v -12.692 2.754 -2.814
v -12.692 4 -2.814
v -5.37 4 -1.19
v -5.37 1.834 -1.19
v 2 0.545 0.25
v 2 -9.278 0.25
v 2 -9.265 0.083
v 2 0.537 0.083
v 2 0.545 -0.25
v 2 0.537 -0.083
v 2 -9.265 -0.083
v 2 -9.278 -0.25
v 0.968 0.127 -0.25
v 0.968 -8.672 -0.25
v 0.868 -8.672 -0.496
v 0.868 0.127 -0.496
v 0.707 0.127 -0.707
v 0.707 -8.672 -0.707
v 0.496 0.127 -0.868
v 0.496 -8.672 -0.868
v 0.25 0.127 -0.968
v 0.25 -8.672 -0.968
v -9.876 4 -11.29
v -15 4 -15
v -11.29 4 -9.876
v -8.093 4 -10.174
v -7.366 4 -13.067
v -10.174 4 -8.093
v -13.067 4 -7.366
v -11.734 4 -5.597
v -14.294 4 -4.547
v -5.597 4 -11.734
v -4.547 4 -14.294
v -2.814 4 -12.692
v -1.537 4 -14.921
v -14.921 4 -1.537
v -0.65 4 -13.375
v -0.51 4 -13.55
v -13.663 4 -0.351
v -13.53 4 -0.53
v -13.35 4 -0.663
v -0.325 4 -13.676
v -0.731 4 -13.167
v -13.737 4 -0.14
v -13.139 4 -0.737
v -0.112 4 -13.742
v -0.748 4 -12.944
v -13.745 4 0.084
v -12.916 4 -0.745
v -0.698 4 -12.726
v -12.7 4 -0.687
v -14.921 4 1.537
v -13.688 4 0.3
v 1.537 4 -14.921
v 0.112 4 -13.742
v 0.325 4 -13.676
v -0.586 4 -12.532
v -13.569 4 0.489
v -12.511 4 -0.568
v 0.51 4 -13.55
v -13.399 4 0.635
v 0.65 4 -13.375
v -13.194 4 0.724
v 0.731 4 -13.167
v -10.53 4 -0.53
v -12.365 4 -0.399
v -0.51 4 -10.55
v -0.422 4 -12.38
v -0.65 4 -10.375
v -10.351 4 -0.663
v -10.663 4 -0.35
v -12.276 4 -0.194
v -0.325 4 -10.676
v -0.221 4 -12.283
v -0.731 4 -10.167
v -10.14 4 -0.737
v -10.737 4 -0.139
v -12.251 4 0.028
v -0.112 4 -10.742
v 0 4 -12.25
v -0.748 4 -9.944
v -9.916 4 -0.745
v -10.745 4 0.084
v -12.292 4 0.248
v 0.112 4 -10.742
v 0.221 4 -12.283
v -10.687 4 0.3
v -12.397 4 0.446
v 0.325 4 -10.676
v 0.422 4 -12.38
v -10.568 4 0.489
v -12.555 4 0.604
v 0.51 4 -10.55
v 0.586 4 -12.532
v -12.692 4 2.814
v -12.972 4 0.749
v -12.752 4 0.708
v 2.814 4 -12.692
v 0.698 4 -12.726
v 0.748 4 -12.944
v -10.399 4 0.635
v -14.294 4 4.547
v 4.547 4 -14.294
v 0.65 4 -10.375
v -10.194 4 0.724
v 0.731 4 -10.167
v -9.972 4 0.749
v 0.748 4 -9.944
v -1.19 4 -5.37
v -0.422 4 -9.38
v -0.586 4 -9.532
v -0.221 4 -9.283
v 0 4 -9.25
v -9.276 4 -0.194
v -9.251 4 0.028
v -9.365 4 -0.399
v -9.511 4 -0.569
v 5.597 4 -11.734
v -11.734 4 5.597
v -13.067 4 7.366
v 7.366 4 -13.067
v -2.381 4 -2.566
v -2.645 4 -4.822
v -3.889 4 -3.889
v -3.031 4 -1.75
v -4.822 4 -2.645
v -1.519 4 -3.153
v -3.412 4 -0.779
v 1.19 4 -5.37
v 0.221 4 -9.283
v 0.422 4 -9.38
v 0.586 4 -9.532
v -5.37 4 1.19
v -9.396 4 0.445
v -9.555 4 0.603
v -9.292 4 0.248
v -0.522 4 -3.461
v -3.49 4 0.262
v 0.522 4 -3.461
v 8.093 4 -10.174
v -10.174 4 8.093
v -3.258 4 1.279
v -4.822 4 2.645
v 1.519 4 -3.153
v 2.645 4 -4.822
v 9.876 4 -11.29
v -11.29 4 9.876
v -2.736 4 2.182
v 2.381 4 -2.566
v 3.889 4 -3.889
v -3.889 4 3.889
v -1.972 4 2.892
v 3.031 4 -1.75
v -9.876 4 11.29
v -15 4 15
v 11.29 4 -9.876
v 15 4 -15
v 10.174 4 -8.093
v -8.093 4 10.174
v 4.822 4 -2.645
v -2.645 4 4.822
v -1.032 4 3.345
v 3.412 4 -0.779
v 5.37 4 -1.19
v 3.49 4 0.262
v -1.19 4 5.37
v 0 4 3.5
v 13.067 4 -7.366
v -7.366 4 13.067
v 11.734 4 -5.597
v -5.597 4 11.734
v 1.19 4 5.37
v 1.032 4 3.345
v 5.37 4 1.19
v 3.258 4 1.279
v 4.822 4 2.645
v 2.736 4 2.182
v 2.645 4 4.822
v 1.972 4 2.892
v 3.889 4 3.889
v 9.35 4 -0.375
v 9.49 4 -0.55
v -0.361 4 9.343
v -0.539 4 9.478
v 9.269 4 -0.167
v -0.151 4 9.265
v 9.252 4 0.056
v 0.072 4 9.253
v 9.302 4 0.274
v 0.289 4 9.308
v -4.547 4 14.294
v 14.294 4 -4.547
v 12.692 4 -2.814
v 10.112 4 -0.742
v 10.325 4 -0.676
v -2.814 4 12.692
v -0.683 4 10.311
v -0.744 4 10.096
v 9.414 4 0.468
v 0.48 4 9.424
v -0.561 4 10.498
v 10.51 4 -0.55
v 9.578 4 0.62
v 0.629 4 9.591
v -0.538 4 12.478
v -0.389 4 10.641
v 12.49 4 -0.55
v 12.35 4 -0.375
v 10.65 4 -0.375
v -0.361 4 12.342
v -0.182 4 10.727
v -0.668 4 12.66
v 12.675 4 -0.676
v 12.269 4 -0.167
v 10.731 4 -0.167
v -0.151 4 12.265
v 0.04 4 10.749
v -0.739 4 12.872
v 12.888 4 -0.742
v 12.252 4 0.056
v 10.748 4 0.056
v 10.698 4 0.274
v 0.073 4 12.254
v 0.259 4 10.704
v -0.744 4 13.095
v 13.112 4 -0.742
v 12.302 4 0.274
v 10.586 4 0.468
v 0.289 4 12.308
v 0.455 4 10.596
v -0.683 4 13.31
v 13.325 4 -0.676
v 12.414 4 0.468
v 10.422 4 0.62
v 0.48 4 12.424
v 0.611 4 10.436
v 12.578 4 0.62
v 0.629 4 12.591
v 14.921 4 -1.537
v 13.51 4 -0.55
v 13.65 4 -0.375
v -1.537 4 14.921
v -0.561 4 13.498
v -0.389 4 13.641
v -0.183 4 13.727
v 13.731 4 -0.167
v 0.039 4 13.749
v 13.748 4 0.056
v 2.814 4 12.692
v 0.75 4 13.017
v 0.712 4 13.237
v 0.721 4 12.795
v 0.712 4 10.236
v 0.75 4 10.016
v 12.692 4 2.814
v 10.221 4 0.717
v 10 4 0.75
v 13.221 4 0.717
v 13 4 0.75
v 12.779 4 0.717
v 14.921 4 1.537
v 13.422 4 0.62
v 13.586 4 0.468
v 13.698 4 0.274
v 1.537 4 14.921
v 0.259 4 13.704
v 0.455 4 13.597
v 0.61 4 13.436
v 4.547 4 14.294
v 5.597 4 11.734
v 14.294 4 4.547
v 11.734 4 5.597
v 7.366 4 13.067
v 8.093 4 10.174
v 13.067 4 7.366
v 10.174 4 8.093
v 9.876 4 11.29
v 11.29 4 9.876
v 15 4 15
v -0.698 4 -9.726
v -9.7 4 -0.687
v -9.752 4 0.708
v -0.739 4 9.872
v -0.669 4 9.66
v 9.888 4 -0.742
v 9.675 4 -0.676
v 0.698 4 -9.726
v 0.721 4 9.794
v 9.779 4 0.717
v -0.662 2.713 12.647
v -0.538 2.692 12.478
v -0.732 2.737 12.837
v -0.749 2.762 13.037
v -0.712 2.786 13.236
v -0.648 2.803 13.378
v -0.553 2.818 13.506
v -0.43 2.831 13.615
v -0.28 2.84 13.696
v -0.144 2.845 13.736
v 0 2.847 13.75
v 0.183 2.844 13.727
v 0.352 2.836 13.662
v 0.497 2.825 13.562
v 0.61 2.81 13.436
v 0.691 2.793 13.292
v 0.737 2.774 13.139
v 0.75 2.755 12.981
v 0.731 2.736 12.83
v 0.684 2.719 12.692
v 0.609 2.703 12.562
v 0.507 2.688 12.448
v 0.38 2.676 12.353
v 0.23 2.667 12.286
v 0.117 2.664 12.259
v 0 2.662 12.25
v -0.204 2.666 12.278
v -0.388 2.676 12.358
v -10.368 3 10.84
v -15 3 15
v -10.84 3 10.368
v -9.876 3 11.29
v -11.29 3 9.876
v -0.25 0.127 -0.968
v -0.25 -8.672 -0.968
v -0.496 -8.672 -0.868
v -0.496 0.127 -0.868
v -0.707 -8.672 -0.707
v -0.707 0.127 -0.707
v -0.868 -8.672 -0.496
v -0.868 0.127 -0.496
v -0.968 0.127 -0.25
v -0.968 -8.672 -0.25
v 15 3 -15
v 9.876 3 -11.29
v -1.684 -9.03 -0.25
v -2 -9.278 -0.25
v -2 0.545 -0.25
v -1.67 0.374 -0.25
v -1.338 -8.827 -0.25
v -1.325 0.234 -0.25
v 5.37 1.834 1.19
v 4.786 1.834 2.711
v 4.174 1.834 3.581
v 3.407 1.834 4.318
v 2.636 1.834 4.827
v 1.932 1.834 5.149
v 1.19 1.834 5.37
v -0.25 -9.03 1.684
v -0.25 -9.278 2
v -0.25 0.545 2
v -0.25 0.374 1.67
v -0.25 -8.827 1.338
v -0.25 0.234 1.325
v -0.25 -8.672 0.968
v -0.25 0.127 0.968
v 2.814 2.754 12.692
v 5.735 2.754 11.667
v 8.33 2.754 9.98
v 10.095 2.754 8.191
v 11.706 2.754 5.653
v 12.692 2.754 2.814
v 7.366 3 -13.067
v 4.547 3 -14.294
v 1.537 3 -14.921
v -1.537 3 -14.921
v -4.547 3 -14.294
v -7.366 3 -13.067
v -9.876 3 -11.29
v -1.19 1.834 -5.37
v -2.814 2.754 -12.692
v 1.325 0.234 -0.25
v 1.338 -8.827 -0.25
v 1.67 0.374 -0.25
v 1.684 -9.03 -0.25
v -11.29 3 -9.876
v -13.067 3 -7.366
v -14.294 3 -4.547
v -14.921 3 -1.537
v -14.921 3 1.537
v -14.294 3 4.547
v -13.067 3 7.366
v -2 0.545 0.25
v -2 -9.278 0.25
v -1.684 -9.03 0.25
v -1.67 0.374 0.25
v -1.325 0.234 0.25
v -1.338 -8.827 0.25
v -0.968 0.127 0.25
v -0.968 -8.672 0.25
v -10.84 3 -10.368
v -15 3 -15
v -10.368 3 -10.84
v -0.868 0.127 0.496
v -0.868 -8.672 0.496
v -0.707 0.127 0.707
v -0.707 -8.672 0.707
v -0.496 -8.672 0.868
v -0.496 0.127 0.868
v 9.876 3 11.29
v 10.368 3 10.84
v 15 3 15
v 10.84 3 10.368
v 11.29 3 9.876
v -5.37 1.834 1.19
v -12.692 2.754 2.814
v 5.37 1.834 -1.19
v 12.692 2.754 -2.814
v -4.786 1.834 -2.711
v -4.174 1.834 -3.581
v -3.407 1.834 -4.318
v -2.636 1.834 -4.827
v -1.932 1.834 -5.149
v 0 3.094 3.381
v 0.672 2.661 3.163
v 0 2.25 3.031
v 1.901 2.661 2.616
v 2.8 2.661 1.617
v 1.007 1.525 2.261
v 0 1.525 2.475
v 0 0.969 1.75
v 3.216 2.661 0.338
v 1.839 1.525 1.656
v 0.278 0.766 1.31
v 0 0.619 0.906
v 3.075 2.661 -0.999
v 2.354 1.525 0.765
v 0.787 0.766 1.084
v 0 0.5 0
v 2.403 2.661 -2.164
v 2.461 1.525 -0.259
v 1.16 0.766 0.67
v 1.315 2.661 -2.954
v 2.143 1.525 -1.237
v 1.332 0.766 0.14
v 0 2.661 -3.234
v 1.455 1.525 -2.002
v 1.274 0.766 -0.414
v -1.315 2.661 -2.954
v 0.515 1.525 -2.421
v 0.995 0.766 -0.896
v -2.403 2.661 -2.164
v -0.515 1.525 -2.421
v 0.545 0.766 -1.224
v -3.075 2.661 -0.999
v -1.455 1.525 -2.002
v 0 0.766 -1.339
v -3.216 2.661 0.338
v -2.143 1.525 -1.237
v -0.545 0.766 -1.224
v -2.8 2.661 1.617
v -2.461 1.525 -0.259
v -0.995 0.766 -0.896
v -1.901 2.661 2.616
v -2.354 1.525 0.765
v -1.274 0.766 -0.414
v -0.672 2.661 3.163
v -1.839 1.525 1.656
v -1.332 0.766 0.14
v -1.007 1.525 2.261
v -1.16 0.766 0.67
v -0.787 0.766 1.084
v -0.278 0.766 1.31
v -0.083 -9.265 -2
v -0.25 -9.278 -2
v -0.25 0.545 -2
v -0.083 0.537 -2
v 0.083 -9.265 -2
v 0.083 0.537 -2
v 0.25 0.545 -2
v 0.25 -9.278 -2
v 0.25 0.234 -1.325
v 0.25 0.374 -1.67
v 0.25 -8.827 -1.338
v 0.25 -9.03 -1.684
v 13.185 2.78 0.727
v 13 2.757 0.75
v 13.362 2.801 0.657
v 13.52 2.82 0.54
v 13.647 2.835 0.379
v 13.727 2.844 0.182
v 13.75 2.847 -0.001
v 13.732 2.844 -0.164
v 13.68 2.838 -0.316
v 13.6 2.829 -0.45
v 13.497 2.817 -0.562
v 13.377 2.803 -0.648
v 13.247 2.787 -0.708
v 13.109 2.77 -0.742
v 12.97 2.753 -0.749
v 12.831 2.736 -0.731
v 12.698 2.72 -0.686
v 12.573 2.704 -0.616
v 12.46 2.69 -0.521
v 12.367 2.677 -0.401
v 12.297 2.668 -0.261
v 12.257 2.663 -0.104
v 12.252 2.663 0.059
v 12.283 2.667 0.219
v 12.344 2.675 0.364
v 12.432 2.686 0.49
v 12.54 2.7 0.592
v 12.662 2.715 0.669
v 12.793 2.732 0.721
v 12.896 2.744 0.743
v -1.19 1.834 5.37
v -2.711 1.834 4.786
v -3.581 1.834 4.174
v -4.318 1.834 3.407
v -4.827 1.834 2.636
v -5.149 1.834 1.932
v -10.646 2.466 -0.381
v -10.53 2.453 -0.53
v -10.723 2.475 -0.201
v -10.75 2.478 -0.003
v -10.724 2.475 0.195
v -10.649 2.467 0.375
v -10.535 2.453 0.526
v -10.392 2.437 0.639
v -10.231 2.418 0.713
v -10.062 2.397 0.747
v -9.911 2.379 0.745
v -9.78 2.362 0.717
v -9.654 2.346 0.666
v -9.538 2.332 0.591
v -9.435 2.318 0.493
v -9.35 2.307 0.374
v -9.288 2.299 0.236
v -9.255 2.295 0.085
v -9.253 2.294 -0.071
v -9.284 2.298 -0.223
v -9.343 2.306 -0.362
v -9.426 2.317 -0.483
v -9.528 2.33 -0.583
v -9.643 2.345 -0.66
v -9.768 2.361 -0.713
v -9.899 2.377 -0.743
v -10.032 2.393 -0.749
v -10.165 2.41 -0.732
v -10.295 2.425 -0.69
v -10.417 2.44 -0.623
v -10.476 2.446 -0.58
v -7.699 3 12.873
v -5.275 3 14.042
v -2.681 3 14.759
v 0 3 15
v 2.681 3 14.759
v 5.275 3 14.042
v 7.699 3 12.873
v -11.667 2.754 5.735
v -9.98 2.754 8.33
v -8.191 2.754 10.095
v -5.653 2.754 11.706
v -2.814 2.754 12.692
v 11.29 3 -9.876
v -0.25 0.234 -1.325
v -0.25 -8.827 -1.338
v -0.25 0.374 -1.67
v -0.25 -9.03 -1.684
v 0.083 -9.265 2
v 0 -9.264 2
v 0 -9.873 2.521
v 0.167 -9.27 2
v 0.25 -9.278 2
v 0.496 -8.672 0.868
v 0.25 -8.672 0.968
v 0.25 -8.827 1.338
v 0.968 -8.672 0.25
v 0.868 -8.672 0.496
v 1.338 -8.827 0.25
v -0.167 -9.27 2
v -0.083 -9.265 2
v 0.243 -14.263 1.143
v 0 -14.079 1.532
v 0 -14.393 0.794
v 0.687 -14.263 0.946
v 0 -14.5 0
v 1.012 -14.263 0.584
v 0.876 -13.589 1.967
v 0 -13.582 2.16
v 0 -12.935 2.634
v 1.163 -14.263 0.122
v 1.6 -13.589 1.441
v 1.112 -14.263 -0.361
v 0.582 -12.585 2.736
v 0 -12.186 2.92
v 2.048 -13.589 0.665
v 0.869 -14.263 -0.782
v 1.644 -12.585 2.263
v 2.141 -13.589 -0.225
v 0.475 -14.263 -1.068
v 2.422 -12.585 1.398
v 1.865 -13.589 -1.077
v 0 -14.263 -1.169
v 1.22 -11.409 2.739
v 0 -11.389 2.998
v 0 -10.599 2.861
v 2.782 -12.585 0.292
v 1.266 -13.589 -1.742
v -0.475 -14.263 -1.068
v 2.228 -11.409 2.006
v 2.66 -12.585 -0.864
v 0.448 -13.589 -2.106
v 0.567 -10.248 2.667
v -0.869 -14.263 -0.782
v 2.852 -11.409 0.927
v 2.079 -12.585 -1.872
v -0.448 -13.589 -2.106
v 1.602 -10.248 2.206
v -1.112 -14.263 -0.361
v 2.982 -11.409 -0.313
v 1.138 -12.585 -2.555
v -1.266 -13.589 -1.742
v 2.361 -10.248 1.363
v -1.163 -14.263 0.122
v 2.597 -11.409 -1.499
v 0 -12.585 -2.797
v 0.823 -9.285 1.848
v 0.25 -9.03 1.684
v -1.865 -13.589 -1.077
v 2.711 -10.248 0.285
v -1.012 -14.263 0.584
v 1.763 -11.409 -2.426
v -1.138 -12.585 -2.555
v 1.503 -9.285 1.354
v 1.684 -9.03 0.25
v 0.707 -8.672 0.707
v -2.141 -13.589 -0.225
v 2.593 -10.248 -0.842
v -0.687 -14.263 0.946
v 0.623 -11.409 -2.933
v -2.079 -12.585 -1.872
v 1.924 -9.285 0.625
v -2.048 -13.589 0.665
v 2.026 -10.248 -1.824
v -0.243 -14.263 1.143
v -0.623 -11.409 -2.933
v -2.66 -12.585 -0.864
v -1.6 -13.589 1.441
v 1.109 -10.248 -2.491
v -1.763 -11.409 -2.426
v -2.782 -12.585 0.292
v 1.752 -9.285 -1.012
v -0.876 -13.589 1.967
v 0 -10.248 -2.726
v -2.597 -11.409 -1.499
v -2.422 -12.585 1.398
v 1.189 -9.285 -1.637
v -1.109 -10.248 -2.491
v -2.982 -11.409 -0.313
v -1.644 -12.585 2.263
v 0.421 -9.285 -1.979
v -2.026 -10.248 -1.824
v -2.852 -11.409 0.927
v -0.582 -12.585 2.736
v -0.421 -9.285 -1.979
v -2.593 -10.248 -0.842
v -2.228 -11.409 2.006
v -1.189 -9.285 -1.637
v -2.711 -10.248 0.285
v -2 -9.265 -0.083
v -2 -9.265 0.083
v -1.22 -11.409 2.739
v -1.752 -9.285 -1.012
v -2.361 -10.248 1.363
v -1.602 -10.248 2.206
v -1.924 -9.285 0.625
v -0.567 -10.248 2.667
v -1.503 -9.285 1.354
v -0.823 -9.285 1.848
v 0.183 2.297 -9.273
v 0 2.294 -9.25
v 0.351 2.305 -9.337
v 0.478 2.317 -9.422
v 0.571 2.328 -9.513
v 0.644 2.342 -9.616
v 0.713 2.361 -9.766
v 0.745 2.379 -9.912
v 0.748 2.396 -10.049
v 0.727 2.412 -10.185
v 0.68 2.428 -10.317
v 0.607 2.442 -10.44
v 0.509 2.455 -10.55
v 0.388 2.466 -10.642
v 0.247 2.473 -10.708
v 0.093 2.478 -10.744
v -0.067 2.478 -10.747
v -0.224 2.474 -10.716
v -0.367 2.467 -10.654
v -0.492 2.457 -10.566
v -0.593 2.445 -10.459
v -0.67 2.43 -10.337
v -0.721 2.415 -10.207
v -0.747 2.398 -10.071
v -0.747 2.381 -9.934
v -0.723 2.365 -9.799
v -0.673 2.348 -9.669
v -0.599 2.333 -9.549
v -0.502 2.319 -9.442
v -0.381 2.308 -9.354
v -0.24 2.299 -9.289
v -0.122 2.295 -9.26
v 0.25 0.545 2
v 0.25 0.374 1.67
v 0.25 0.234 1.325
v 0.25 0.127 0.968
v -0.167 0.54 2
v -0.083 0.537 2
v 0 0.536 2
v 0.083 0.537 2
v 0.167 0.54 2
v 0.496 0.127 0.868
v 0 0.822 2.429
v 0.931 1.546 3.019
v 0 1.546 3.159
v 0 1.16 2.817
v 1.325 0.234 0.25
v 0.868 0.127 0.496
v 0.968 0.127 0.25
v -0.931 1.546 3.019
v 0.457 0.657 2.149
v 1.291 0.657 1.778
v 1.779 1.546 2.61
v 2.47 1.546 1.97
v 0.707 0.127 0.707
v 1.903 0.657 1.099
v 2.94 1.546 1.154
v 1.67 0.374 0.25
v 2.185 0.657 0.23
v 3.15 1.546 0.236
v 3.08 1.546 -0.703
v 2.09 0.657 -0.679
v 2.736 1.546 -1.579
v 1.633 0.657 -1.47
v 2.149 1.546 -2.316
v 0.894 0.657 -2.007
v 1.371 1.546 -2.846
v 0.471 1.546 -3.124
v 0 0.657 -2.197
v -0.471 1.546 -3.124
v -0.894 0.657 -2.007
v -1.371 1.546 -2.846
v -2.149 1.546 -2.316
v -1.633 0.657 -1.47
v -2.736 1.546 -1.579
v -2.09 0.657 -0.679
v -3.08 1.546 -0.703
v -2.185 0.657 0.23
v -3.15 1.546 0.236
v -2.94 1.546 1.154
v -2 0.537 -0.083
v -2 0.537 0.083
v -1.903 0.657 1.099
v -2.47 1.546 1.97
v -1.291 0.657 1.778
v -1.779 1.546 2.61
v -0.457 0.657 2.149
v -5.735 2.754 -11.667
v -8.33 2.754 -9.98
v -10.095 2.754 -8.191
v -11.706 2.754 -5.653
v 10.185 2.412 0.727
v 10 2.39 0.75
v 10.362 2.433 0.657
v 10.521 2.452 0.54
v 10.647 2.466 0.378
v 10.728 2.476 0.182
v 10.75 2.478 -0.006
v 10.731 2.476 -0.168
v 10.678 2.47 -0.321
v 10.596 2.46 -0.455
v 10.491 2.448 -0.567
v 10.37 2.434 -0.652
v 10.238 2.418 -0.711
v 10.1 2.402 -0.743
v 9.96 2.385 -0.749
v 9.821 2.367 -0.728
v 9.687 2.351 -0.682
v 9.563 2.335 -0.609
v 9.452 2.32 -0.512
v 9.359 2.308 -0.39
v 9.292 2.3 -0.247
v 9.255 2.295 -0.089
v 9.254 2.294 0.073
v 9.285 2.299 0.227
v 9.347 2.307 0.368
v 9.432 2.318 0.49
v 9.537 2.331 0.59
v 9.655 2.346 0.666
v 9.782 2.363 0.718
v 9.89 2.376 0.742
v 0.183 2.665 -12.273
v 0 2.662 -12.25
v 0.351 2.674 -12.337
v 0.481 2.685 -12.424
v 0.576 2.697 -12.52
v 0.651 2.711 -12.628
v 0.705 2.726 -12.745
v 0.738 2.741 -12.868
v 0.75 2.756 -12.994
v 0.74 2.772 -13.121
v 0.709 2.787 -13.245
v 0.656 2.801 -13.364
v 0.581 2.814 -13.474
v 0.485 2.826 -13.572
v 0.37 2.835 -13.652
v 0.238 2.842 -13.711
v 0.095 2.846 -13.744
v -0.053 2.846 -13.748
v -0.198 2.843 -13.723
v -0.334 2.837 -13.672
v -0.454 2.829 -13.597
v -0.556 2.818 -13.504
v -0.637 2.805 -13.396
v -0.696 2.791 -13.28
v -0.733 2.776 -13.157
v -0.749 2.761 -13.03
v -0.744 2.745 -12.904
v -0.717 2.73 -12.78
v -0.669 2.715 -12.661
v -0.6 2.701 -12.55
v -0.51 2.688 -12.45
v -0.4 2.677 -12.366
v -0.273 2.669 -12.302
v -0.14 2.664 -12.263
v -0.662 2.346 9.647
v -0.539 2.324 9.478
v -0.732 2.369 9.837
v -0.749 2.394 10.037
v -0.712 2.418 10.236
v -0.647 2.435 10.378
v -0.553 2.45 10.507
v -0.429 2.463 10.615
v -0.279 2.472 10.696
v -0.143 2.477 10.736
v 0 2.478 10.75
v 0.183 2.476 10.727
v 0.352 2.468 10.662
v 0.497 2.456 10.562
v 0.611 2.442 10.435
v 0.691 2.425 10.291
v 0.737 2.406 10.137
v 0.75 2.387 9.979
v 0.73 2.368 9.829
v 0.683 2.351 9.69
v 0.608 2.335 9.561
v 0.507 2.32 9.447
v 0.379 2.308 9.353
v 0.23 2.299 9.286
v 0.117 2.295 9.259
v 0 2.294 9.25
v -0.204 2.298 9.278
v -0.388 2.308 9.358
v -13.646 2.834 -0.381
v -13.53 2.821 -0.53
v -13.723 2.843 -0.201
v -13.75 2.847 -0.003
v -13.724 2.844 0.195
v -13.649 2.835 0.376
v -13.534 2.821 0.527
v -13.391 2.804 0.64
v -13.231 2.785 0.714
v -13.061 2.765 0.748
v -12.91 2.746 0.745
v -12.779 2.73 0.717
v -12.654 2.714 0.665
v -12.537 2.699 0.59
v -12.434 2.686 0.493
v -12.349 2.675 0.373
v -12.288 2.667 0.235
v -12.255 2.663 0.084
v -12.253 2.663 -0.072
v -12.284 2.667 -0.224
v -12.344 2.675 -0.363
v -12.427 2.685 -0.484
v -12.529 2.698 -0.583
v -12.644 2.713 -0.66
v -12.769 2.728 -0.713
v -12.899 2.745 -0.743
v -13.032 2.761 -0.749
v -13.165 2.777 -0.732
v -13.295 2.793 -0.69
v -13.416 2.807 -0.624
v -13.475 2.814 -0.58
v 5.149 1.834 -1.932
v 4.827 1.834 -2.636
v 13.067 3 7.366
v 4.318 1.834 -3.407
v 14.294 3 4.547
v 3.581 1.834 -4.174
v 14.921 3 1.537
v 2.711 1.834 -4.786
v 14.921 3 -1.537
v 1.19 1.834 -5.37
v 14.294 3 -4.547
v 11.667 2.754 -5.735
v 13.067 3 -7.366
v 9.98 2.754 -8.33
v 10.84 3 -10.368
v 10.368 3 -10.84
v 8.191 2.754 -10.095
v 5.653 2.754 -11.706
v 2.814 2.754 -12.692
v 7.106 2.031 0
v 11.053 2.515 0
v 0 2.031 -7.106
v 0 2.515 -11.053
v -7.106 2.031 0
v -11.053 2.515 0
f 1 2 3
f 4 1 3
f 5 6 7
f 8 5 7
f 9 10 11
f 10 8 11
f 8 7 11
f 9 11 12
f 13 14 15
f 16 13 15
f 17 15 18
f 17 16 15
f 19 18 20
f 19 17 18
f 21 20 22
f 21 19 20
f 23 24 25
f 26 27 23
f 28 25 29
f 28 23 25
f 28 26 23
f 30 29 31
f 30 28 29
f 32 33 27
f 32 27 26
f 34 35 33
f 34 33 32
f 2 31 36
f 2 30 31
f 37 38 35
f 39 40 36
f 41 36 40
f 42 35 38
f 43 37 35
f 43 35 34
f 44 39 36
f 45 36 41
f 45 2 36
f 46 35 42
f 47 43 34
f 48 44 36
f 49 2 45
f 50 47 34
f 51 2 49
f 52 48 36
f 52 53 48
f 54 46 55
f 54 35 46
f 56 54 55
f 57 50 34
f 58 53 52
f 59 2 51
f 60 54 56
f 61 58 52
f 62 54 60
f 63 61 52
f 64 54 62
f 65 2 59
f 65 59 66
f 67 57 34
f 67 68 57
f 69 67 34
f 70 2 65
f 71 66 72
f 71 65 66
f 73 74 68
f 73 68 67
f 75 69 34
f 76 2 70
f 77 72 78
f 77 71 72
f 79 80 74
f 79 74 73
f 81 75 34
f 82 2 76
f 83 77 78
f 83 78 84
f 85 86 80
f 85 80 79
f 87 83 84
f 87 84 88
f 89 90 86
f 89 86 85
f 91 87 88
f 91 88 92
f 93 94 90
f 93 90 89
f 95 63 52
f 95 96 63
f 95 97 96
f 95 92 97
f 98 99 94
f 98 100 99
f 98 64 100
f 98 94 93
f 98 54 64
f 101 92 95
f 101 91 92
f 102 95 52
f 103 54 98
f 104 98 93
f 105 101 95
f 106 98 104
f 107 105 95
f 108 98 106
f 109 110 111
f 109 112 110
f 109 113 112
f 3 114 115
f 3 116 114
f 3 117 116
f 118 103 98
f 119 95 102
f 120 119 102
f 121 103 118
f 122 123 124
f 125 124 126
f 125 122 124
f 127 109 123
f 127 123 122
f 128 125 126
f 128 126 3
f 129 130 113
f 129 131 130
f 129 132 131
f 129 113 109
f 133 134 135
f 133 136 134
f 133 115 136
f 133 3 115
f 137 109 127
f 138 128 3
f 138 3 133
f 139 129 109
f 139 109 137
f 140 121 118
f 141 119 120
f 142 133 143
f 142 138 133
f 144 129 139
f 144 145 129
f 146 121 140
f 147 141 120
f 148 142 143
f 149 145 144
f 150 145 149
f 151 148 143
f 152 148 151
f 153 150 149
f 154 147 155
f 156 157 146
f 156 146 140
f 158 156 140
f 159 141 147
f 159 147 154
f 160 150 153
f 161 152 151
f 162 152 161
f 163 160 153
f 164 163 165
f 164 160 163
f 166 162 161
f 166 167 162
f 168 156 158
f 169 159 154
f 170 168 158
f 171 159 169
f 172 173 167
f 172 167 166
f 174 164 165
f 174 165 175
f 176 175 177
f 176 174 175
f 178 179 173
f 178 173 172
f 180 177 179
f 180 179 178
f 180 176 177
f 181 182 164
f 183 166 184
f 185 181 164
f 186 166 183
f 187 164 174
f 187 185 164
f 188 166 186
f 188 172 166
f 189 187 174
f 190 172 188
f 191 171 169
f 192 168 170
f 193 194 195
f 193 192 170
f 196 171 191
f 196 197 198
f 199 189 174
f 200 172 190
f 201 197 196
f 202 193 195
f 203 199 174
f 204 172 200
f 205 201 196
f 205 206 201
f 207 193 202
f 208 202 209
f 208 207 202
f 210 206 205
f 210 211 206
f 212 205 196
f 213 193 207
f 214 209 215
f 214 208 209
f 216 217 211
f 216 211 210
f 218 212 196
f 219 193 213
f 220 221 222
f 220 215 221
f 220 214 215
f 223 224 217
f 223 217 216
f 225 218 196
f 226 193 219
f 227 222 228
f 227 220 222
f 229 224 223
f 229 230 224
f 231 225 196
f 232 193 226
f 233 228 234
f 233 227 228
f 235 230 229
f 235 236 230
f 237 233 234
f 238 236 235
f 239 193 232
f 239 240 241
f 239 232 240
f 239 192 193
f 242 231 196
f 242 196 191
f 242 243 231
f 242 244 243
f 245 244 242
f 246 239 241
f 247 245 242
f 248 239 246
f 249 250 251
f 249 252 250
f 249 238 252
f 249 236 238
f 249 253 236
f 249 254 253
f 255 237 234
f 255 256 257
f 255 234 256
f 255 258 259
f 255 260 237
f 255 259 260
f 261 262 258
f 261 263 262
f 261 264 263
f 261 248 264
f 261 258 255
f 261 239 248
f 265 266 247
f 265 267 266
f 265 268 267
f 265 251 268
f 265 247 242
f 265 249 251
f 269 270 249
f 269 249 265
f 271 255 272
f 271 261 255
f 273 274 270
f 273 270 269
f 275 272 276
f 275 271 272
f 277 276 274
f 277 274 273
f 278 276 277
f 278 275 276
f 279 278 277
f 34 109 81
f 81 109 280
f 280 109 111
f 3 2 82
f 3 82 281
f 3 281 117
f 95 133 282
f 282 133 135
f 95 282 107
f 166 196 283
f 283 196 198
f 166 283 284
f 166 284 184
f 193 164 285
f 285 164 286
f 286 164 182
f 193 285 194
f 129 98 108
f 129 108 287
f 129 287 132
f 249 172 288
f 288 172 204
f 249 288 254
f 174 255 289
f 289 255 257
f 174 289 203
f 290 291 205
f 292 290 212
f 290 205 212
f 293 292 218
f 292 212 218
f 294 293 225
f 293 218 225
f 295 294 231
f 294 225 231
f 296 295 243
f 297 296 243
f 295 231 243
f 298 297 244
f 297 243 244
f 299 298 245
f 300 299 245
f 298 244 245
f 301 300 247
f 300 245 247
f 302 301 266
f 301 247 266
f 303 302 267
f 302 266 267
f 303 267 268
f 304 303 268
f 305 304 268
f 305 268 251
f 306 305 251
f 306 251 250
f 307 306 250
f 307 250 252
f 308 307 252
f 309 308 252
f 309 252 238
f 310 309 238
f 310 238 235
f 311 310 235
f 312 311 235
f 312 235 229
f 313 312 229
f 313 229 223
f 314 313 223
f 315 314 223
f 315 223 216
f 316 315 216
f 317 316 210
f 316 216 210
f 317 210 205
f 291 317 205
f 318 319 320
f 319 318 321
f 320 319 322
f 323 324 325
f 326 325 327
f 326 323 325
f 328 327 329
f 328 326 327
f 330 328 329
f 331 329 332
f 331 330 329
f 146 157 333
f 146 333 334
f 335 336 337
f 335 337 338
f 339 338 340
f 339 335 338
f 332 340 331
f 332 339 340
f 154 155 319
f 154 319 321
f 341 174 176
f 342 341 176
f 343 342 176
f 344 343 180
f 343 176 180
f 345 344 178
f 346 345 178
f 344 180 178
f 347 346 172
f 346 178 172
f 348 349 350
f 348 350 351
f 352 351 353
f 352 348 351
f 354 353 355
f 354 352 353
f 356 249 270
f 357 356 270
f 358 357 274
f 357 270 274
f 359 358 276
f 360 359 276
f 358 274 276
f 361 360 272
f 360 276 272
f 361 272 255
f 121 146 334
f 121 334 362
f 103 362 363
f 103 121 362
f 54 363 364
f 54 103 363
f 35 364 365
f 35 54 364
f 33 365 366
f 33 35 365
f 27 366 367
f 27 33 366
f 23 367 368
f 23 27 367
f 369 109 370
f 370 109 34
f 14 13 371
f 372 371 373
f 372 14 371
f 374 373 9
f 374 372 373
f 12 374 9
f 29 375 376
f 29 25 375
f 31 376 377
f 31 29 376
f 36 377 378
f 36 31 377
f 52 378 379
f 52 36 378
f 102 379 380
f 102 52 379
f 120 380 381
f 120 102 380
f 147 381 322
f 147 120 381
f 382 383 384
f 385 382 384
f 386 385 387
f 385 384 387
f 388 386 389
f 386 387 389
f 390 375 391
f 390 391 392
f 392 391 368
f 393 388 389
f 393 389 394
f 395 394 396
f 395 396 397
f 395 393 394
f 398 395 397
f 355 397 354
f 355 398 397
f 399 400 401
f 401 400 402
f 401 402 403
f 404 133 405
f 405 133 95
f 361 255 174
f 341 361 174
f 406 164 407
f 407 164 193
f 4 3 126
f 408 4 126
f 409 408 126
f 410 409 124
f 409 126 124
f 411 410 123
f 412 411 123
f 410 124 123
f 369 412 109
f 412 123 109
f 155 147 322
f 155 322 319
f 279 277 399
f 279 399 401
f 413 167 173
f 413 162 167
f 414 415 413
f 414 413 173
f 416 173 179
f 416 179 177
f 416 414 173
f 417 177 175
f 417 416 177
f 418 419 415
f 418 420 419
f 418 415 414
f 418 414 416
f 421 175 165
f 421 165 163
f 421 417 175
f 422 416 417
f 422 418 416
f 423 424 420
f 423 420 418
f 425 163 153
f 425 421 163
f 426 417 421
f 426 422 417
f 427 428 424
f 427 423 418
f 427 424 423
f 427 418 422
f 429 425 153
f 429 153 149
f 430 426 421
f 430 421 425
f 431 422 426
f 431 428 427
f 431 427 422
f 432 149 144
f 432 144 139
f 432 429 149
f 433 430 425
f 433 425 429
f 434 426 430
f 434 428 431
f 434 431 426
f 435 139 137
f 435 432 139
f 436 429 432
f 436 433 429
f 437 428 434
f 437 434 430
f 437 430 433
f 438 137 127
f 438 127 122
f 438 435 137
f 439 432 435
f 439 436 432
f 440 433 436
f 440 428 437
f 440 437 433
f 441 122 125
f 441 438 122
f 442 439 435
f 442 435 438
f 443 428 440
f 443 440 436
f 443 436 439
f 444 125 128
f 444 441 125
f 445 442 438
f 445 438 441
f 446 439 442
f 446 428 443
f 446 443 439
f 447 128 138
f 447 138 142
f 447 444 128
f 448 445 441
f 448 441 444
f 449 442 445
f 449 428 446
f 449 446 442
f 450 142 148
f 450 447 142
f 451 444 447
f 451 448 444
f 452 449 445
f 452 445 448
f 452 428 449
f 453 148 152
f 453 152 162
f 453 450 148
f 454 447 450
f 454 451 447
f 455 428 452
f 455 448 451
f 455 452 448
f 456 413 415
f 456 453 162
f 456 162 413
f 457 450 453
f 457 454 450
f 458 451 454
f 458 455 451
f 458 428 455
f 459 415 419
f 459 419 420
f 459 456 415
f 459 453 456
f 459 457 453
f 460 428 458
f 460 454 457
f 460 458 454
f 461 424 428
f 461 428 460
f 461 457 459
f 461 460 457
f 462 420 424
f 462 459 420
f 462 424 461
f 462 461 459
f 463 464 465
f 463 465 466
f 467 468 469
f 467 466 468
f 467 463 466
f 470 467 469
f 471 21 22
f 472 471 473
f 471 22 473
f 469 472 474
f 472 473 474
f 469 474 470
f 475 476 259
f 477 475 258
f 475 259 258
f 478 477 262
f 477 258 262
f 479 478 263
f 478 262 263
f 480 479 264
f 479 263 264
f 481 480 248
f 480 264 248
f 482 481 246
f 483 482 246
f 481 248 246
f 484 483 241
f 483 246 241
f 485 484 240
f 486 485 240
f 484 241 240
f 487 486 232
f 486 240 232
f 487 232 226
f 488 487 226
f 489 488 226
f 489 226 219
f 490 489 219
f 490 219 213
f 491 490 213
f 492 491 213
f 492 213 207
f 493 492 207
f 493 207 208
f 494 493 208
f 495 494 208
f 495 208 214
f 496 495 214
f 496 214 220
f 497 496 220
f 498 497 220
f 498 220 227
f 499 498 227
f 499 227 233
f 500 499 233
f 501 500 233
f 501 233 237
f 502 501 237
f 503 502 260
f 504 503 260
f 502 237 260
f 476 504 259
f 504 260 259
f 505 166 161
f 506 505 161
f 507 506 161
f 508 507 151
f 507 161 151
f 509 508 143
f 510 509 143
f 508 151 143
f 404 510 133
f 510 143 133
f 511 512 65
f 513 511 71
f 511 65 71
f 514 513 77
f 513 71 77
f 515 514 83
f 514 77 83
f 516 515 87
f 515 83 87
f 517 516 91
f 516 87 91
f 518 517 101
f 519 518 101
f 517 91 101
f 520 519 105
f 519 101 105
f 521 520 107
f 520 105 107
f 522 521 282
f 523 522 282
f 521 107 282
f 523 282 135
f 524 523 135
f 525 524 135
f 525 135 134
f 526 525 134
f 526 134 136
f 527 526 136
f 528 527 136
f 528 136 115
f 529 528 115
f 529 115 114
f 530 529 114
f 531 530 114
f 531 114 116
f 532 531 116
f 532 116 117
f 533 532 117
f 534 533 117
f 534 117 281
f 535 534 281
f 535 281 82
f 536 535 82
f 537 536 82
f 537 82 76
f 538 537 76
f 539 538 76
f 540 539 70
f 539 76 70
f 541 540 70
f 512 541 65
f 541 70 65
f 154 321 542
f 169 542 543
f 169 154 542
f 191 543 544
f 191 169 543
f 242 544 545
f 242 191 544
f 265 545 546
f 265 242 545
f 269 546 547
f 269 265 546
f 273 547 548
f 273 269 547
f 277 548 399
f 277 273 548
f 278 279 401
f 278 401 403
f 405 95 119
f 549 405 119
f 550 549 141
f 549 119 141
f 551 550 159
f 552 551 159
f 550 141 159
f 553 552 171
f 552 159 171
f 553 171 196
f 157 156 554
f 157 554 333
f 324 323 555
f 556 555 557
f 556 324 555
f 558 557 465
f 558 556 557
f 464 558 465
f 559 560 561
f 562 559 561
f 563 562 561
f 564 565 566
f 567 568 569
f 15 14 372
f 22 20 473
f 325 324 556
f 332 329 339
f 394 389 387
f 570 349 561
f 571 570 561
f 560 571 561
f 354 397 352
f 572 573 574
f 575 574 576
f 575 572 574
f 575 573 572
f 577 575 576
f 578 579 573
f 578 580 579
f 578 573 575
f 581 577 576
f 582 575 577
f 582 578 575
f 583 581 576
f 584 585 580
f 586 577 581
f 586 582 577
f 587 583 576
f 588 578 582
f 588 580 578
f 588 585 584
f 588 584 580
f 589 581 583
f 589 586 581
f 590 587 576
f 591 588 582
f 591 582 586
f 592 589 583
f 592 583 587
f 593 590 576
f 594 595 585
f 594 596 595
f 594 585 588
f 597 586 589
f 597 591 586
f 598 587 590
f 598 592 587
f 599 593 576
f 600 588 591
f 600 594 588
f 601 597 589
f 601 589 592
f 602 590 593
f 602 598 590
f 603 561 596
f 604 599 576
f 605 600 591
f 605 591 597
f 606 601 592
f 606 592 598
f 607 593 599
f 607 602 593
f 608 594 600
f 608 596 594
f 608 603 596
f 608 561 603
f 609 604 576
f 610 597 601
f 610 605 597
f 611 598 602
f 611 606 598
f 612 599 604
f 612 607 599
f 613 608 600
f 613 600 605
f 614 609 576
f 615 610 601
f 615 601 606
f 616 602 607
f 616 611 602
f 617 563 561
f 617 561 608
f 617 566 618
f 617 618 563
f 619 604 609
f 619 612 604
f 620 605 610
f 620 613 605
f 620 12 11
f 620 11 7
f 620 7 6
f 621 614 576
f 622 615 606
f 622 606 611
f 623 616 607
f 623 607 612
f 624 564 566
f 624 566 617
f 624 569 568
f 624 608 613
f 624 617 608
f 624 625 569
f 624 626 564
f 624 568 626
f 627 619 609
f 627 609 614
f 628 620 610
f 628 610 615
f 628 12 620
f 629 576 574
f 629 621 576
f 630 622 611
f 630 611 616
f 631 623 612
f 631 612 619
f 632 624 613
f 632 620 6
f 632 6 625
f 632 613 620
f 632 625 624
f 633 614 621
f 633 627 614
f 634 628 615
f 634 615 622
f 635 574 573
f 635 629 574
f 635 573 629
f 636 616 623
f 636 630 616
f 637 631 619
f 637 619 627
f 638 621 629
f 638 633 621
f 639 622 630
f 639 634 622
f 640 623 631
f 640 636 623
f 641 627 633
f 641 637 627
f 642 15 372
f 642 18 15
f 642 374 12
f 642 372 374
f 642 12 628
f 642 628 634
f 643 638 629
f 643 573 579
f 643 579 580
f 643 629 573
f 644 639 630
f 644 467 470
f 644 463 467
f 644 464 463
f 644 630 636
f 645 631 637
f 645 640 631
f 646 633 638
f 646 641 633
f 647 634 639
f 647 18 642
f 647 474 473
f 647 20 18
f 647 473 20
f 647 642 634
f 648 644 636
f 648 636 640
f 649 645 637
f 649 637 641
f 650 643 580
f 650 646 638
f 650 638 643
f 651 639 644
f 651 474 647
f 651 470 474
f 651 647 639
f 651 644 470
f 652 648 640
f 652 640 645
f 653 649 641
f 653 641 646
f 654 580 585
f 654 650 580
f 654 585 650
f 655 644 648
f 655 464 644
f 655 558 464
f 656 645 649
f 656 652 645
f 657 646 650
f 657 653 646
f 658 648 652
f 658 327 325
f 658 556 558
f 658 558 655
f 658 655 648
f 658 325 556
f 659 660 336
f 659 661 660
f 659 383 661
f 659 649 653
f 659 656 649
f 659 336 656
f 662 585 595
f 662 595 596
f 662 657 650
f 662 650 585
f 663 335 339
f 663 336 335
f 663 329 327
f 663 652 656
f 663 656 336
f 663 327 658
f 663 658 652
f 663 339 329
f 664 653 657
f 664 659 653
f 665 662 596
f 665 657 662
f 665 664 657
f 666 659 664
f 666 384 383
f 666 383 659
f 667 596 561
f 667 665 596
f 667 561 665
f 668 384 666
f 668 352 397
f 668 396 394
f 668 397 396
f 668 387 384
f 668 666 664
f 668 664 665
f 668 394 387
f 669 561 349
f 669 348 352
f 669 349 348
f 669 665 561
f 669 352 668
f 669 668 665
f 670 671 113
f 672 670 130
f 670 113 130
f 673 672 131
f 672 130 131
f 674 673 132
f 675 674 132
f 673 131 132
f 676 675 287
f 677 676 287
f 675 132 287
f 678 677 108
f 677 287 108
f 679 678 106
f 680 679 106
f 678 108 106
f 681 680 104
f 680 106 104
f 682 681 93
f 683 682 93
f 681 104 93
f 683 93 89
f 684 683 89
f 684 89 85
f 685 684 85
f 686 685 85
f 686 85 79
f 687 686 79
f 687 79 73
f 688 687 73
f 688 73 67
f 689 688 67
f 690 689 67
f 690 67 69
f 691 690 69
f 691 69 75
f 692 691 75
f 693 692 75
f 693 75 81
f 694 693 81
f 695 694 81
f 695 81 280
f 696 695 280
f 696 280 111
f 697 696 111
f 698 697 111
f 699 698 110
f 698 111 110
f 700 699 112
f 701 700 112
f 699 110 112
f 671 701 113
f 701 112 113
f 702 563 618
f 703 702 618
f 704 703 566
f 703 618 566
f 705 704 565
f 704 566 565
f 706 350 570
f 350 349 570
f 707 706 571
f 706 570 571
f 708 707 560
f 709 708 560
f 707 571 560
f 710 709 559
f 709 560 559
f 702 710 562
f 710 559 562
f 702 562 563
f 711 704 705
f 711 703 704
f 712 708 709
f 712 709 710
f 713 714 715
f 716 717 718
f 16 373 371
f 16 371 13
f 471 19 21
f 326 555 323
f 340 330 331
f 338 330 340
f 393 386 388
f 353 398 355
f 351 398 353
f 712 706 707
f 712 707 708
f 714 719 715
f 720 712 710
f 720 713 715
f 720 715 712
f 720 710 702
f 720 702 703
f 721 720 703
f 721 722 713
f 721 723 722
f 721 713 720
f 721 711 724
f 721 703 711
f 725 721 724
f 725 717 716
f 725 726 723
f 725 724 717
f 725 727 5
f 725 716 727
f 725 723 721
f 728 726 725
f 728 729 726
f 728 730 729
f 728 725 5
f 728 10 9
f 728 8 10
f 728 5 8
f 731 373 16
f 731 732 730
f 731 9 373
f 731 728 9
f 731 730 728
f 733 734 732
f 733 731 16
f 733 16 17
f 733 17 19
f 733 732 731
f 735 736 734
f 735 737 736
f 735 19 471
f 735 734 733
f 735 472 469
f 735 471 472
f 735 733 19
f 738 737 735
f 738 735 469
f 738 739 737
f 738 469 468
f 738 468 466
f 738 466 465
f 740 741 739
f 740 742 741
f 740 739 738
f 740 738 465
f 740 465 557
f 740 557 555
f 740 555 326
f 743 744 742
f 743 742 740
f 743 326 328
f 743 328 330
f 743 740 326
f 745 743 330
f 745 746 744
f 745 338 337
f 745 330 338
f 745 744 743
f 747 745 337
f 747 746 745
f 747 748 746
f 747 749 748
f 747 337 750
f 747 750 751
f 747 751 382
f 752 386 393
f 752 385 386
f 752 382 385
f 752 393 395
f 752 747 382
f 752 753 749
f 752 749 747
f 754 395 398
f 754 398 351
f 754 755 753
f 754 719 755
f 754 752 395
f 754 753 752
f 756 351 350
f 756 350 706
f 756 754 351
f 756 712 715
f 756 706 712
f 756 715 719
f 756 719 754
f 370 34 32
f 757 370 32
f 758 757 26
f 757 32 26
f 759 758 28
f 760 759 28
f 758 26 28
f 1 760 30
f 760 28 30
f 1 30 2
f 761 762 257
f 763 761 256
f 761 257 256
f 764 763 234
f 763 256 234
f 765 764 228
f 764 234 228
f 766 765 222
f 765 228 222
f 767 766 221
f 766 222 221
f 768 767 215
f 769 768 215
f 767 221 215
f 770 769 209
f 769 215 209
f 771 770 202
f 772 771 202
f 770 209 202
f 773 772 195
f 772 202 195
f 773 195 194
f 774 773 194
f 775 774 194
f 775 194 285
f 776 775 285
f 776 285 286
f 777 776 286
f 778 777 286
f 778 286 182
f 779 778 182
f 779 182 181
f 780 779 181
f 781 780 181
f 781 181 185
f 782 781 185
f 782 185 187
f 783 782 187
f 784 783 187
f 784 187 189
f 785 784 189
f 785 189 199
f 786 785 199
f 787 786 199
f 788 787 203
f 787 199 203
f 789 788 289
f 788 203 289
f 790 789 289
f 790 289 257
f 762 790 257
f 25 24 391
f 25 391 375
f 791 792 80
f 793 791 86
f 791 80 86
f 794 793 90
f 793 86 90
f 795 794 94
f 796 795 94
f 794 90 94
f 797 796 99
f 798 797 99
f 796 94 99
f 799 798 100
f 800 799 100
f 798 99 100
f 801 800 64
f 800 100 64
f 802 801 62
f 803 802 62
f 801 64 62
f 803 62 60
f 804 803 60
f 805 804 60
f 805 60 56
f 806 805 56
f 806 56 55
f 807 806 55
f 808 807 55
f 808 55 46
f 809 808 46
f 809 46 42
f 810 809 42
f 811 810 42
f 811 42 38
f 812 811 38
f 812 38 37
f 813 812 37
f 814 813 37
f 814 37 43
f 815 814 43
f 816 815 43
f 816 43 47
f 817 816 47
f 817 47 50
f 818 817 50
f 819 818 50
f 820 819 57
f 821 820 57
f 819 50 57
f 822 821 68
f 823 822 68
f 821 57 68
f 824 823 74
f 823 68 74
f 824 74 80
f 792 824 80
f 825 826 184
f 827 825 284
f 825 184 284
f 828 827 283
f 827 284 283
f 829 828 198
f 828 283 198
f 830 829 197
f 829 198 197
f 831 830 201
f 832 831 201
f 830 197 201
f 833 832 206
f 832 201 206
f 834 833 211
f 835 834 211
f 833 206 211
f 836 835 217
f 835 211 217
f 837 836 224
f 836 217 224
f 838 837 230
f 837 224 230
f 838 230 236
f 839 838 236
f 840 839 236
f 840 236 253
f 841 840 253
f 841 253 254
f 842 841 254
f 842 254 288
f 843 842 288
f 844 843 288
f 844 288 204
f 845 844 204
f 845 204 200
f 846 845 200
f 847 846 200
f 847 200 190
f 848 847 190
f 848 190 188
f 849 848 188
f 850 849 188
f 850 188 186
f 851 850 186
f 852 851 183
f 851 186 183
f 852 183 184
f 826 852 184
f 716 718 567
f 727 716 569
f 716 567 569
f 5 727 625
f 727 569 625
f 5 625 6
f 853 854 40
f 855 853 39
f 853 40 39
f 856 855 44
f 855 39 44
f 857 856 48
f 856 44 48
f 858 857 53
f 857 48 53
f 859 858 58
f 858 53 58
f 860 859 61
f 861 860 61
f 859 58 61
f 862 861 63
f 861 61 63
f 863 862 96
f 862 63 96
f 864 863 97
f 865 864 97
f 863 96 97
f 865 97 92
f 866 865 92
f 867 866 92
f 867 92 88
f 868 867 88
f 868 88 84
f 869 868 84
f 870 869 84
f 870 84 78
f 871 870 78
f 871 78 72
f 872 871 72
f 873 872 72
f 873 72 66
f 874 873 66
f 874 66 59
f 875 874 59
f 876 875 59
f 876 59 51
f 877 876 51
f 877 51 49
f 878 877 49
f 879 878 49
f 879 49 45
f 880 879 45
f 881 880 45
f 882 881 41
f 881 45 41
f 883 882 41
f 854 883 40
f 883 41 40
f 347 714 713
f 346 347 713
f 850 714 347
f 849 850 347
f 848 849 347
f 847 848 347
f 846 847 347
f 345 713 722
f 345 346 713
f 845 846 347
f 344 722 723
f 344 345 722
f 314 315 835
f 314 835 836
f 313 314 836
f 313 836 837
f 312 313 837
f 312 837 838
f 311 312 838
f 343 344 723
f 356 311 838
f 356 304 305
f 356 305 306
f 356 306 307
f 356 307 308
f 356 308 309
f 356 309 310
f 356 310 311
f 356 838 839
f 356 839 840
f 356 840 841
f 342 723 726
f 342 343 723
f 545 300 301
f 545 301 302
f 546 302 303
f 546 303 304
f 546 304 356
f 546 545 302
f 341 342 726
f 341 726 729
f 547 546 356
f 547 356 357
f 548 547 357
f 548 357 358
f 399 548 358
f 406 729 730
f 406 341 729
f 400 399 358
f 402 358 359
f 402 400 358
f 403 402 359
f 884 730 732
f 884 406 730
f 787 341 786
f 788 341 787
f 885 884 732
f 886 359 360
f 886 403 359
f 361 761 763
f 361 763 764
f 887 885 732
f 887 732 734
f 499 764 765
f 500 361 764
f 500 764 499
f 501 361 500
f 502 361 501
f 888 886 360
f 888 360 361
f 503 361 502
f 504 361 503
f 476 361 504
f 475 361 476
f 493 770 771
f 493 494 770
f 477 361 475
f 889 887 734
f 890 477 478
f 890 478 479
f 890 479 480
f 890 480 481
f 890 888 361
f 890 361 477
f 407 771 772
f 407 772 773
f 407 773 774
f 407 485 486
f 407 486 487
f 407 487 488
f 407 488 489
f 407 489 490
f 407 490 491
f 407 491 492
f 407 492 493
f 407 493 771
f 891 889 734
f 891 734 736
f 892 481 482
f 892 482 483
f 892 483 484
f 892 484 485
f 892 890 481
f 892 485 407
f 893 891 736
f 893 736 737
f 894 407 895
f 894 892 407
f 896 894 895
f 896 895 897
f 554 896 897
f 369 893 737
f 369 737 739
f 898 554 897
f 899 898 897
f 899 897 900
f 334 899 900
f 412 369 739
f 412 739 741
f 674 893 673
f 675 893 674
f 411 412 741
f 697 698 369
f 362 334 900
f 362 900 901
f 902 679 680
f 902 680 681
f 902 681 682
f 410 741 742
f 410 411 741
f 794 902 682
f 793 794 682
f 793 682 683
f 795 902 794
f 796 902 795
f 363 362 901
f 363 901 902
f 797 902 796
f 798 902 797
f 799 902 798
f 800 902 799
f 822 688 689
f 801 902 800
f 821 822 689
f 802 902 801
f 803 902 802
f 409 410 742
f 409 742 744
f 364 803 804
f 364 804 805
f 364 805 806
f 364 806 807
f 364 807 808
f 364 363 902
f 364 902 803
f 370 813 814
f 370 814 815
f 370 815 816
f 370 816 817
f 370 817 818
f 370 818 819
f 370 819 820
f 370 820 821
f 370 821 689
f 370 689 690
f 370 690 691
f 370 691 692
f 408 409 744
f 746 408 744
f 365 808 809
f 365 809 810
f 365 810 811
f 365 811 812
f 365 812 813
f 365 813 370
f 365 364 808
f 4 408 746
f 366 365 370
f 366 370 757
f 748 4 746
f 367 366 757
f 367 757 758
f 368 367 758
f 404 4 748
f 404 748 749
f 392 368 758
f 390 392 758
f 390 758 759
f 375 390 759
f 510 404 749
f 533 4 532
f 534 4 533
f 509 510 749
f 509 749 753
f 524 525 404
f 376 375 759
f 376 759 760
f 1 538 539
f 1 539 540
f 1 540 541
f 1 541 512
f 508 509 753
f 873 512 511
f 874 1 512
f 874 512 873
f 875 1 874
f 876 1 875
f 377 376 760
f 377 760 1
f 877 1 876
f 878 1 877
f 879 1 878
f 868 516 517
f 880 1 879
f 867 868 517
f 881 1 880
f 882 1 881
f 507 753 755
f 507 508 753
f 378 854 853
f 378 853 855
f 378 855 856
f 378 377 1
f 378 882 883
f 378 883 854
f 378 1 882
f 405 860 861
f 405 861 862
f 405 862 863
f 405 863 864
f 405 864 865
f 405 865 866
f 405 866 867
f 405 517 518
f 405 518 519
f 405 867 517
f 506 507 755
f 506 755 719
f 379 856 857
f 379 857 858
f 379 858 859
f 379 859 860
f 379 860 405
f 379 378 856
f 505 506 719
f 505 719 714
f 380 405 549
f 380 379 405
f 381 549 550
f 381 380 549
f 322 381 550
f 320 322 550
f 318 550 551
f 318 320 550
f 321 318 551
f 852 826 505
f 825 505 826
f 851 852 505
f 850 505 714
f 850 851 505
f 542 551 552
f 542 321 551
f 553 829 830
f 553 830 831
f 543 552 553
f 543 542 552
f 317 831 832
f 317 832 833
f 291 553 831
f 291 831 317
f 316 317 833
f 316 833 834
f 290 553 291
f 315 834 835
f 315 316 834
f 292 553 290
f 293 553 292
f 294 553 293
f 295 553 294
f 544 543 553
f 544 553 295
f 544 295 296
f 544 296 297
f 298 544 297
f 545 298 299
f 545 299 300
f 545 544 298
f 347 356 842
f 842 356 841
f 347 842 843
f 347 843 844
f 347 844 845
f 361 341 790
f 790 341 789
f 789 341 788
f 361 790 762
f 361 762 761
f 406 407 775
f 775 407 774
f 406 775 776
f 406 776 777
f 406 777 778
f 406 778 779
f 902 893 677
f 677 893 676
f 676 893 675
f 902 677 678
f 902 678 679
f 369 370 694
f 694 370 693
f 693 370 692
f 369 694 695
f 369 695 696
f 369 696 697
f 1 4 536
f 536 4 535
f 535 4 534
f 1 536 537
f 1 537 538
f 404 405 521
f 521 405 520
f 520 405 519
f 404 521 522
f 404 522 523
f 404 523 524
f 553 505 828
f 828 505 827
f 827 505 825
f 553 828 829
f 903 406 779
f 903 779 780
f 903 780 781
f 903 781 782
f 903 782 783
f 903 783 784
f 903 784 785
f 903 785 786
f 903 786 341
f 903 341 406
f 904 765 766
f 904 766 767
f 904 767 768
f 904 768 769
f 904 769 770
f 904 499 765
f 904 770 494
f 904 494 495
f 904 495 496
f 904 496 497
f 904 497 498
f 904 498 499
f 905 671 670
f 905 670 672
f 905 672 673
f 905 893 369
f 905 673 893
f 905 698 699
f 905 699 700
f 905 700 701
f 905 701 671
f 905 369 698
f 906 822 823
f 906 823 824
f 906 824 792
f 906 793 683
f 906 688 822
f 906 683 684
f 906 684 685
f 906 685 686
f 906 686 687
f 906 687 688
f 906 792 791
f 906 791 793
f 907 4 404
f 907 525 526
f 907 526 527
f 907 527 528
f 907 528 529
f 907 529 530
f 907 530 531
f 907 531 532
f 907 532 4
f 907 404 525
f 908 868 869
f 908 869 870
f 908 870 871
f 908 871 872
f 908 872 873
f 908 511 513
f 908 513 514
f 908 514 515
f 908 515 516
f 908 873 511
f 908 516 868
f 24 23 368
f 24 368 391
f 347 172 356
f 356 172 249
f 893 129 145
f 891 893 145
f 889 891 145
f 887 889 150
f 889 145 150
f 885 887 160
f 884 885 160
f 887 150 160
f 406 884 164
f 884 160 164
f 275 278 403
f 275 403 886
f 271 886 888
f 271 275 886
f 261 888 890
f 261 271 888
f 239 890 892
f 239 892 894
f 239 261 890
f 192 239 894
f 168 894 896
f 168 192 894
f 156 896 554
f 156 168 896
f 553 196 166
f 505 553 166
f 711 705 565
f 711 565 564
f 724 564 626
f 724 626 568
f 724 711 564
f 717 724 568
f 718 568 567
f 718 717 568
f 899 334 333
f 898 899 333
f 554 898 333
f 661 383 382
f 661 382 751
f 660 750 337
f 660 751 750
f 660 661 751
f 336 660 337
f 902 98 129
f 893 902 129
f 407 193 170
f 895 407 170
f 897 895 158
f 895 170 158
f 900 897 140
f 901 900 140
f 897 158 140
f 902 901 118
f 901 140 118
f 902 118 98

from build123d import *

# Parameters (mm, degrees)
SKETCH3_W                       = 0.5
SKETCH3_H                       = 1.75
SKETCH3_W_2                     = 1.75
SKETCH3_H_2                     = 0.5
BOSS_EXTRUDE1_DEPTH             = 13
BOSS_EXTRUDE1_DIRECTION_2_REACH = 27.695
SKETCH4_R                       = 0.75
CUT_EXTRUDE2_DEPTH              = 4
BOSS_EXTRUDE2_DEPTH             = 1


with BuildPart() as part:
    # Sketch1 → Revolve1 (revolve)
    with BuildSketch(Plane(origin=(0, 0, 0), x_dir=(0, 0, -1), z_dir=(1, 0, 0))):
        with BuildLine():
            ThreePointArc((-3.5, 4), (-2.474873734, 1.525126266), (0, 0.5))
            Line((0, 0.5), (0, 0))
            Line((0, 0), (0, -8.5))
            Line((0, -8.5), (0, -14.5))
            ThreePointArc((0, -14.5), (-2.956795679, -12.007305936), (-1, -8.671572875))
            Line((-1, -8.671572875), (-1, 0.127016654))
            ThreePointArc((-1, 0.127016654), (-2.197145125, 0.657463044), (-3.158848322, 1.546089391))
            Line((-3.158848322, 1.546089391), (-15, 3))
            Line((-15, 3), (-15, 4))
            Line((-15, 4), (-4, 4))
            Line((-4, 4), (-3.5, 4))
        make_face()
    revolve(axis=Axis((0, 10.634252877, 0), (0, 1, 0)))

    # Sketch3 → Boss-Extrude1 (add)
    with BuildSketch(Plane(origin=(0, 0, 0), x_dir=(1, 0, 0), z_dir=(0, 1, 0))):
        with Locations((0, 1.125)):
            Rectangle(SKETCH3_W, SKETCH3_H)
        with Locations((-1.125, 0)):
            Rectangle(SKETCH3_W_2, SKETCH3_H_2)
        with Locations((1.125, 0)):
            Rectangle(SKETCH3_W_2, SKETCH3_H_2)
        with Locations((0, -1.125)):
            Rectangle(SKETCH3_W, SKETCH3_H)
    extrude(amount=-BOSS_EXTRUDE1_DEPTH)

    # Sketch3 → Boss-Extrude1 direction 2 (add, up to next)
    with BuildSketch(Plane(origin=(0, 0, 0), x_dir=(1, 0, 0), z_dir=(0, 1, 0)), mode=Mode.PRIVATE) as boss_extrude1_direction_2_sk1:
        with Locations((0, 1.125)):
            Rectangle(SKETCH3_W, SKETCH3_H)
    boss_extrude1_direction_2_tool1 = extrude(boss_extrude1_direction_2_sk1.sketch, amount=BOSS_EXTRUDE1_DIRECTION_2_REACH, mode=Mode.PRIVATE) - part.part
    # Sketch3 → Boss-Extrude1 direction 2 (add, up to next)
    with BuildSketch(Plane(origin=(0, 0, 0), x_dir=(1, 0, 0), z_dir=(0, 1, 0)), mode=Mode.PRIVATE) as boss_extrude1_direction_2_sk2:
        with Locations((-1.125, 0)):
            Rectangle(SKETCH3_W_2, SKETCH3_H_2)
    boss_extrude1_direction_2_tool2 = extrude(boss_extrude1_direction_2_sk2.sketch, amount=BOSS_EXTRUDE1_DIRECTION_2_REACH, mode=Mode.PRIVATE) - part.part
    # Sketch3 → Boss-Extrude1 direction 2 (add, up to next)
    with BuildSketch(Plane(origin=(0, 0, 0), x_dir=(1, 0, 0), z_dir=(0, 1, 0)), mode=Mode.PRIVATE) as boss_extrude1_direction_2_sk3:
        with Locations((1.125, 0)):
            Rectangle(SKETCH3_W_2, SKETCH3_H_2)
    boss_extrude1_direction_2_tool3 = extrude(boss_extrude1_direction_2_sk3.sketch, amount=BOSS_EXTRUDE1_DIRECTION_2_REACH, mode=Mode.PRIVATE) - part.part
    # Sketch3 → Boss-Extrude1 direction 2 (add, up to next)
    with BuildSketch(Plane(origin=(0, 0, 0), x_dir=(1, 0, 0), z_dir=(0, 1, 0)), mode=Mode.PRIVATE) as boss_extrude1_direction_2_sk4:
        with Locations((0, -1.125)):
            Rectangle(SKETCH3_W, SKETCH3_H)
    boss_extrude1_direction_2_tool4 = extrude(boss_extrude1_direction_2_sk4.sketch, amount=BOSS_EXTRUDE1_DIRECTION_2_REACH, mode=Mode.PRIVATE) - part.part
    add(boss_extrude1_direction_2_tool1.solids().sort_by_distance((0, 0, -1.125))[0])
    add(boss_extrude1_direction_2_tool2.solids().sort_by_distance((-1.125, 0, 0))[0])
    add(boss_extrude1_direction_2_tool3.solids().sort_by_distance((1.125, 0, 0))[0])
    add(boss_extrude1_direction_2_tool4.solids().sort_by_distance((0, 0, 1.125))[0])

    # Sketch4 → Cut-Extrude2 (cut)
    with BuildSketch(Plane(origin=(0, 4, 0), x_dir=(1, 0, 0), z_dir=(0, 1, 0))):
        with BuildLine():
            Line((-1.190417877, 5.369628039), (-2.813714981, 12.691848093))
            ThreePointArc((-2.813714981, 12.691848093), (-9.192388155, 9.192388155), (-12.691848093, 2.813714981))
            Line((-12.691848093, 2.813714981), (-5.369628039, 1.190417877))
            ThreePointArc((-5.369628039, 1.190417877), (-3.889087297, 3.889087297), (-1.190417877, 5.369628039))
        make_face()
        with BuildLine():
            Line((-5.369628039, -1.190417877), (-12.691848093, -2.813714981))
            ThreePointArc((-12.691848093, -2.813714981), (-9.192388155, -9.192388155), (-2.813714981, -12.691848093))
            Line((-2.813714981, -12.691848093), (-1.190417877, -5.369628039))
            ThreePointArc((-1.190417877, -5.369628039), (-3.889087297, -3.889087297), (-5.369628039, -1.190417877))
        make_face()
        with BuildLine():
            ThreePointArc((2.813714981, -12.691848093), (9.192388155, -9.192388155), (12.691848093, -2.813714981))
            Line((12.691848093, -2.813714981), (5.369628039, -1.190417877))
            ThreePointArc((5.369628039, -1.190417877), (3.889087297, -3.889087297), (1.190417877, -5.369628039))
            Line((1.190417877, -5.369628039), (2.813714981, -12.691848093))
        make_face()
        with BuildLine():
            ThreePointArc((12.691848093, 2.813714981), (9.192388155, 9.192388155), (2.813714981, 12.691848093))
            Line((2.813714981, 12.691848093), (1.190417877, 5.369628039))
            ThreePointArc((1.190417877, 5.369628039), (3.889087297, 3.889087297), (5.369628039, 1.190417877))
            Line((5.369628039, 1.190417877), (12.691848093, 2.813714981))
        make_face()
        with Locations(Location((-13, 0, 0), (0, 0, 134.983865121))):
            Circle(SKETCH4_R)
        with Locations(Location((-10, 0, 0), (0, 0, 135.012139771))):
            Circle(SKETCH4_R)
        with Locations(Location((0, 10, 0), (0, 0, 270))):
            Circle(SKETCH4_R)
        with Locations(Location((0, 13, 0), (0, 0, 270))):
            Circle(SKETCH4_R)
        with Locations(Location((0, -10, 0), (0, 0, 135.918159621))):
            Circle(SKETCH4_R)
        with Locations(Location((0, -13, 0), (0, 0, 135.875962229))):
            Circle(SKETCH4_R)
        with Locations(Location((10, 0, 0), (0, 0, 270))):
            Circle(SKETCH4_R)
        with Locations(Location((13, 0, 0), (0, 0, 270))):
            Circle(SKETCH4_R)
    extrude(amount=-CUT_EXTRUDE2_DEPTH, mode=Mode.SUBTRACT)

    # Sketch5 → Boss-Extrude2 (add)
    with BuildSketch(Plane(origin=(0, 4, 0), x_dir=(1, 0, 0), z_dir=(0, 1, 0))):
        with BuildLine():
            ThreePointArc((-11.290112025, 9.875898463), (-10.606601718, 10.606601718), (-9.875898463, 11.290112025))
            Line((-9.875898463, 11.290112025), (-15, 15))
            Line((-15, 15), (-11.290112025, 9.875898463))
        make_face()
        with BuildLine():
            Line((15, 15), (9.875898463, 11.290112025))
            ThreePointArc((9.875898463, 11.290112025), (10.606601718, 10.606601718), (11.290112025, 9.875898463))
            Line((11.290112025, 9.875898463), (15, 15))
        make_face()
        with BuildLine():
            ThreePointArc((11.290112025, -9.875898463), (10.606601718, -10.606601718), (9.875898463, -11.290112025))
            Line((9.875898463, -11.290112025), (15, -15))
            Line((15, -15), (11.290112025, -9.875898463))
        make_face()
        with BuildLine():
            ThreePointArc((-9.875898463, -11.290112025), (-10.606601718, -10.606601718), (-11.290112025, -9.875898463))
            Line((-11.290112025, -9.875898463), (-15, -15))
            Line((-15, -15), (-9.875898463, -11.290112025))
        make_face()
    extrude(amount=-BOSS_EXTRUDE2_DEPTH)


solid = part.part
